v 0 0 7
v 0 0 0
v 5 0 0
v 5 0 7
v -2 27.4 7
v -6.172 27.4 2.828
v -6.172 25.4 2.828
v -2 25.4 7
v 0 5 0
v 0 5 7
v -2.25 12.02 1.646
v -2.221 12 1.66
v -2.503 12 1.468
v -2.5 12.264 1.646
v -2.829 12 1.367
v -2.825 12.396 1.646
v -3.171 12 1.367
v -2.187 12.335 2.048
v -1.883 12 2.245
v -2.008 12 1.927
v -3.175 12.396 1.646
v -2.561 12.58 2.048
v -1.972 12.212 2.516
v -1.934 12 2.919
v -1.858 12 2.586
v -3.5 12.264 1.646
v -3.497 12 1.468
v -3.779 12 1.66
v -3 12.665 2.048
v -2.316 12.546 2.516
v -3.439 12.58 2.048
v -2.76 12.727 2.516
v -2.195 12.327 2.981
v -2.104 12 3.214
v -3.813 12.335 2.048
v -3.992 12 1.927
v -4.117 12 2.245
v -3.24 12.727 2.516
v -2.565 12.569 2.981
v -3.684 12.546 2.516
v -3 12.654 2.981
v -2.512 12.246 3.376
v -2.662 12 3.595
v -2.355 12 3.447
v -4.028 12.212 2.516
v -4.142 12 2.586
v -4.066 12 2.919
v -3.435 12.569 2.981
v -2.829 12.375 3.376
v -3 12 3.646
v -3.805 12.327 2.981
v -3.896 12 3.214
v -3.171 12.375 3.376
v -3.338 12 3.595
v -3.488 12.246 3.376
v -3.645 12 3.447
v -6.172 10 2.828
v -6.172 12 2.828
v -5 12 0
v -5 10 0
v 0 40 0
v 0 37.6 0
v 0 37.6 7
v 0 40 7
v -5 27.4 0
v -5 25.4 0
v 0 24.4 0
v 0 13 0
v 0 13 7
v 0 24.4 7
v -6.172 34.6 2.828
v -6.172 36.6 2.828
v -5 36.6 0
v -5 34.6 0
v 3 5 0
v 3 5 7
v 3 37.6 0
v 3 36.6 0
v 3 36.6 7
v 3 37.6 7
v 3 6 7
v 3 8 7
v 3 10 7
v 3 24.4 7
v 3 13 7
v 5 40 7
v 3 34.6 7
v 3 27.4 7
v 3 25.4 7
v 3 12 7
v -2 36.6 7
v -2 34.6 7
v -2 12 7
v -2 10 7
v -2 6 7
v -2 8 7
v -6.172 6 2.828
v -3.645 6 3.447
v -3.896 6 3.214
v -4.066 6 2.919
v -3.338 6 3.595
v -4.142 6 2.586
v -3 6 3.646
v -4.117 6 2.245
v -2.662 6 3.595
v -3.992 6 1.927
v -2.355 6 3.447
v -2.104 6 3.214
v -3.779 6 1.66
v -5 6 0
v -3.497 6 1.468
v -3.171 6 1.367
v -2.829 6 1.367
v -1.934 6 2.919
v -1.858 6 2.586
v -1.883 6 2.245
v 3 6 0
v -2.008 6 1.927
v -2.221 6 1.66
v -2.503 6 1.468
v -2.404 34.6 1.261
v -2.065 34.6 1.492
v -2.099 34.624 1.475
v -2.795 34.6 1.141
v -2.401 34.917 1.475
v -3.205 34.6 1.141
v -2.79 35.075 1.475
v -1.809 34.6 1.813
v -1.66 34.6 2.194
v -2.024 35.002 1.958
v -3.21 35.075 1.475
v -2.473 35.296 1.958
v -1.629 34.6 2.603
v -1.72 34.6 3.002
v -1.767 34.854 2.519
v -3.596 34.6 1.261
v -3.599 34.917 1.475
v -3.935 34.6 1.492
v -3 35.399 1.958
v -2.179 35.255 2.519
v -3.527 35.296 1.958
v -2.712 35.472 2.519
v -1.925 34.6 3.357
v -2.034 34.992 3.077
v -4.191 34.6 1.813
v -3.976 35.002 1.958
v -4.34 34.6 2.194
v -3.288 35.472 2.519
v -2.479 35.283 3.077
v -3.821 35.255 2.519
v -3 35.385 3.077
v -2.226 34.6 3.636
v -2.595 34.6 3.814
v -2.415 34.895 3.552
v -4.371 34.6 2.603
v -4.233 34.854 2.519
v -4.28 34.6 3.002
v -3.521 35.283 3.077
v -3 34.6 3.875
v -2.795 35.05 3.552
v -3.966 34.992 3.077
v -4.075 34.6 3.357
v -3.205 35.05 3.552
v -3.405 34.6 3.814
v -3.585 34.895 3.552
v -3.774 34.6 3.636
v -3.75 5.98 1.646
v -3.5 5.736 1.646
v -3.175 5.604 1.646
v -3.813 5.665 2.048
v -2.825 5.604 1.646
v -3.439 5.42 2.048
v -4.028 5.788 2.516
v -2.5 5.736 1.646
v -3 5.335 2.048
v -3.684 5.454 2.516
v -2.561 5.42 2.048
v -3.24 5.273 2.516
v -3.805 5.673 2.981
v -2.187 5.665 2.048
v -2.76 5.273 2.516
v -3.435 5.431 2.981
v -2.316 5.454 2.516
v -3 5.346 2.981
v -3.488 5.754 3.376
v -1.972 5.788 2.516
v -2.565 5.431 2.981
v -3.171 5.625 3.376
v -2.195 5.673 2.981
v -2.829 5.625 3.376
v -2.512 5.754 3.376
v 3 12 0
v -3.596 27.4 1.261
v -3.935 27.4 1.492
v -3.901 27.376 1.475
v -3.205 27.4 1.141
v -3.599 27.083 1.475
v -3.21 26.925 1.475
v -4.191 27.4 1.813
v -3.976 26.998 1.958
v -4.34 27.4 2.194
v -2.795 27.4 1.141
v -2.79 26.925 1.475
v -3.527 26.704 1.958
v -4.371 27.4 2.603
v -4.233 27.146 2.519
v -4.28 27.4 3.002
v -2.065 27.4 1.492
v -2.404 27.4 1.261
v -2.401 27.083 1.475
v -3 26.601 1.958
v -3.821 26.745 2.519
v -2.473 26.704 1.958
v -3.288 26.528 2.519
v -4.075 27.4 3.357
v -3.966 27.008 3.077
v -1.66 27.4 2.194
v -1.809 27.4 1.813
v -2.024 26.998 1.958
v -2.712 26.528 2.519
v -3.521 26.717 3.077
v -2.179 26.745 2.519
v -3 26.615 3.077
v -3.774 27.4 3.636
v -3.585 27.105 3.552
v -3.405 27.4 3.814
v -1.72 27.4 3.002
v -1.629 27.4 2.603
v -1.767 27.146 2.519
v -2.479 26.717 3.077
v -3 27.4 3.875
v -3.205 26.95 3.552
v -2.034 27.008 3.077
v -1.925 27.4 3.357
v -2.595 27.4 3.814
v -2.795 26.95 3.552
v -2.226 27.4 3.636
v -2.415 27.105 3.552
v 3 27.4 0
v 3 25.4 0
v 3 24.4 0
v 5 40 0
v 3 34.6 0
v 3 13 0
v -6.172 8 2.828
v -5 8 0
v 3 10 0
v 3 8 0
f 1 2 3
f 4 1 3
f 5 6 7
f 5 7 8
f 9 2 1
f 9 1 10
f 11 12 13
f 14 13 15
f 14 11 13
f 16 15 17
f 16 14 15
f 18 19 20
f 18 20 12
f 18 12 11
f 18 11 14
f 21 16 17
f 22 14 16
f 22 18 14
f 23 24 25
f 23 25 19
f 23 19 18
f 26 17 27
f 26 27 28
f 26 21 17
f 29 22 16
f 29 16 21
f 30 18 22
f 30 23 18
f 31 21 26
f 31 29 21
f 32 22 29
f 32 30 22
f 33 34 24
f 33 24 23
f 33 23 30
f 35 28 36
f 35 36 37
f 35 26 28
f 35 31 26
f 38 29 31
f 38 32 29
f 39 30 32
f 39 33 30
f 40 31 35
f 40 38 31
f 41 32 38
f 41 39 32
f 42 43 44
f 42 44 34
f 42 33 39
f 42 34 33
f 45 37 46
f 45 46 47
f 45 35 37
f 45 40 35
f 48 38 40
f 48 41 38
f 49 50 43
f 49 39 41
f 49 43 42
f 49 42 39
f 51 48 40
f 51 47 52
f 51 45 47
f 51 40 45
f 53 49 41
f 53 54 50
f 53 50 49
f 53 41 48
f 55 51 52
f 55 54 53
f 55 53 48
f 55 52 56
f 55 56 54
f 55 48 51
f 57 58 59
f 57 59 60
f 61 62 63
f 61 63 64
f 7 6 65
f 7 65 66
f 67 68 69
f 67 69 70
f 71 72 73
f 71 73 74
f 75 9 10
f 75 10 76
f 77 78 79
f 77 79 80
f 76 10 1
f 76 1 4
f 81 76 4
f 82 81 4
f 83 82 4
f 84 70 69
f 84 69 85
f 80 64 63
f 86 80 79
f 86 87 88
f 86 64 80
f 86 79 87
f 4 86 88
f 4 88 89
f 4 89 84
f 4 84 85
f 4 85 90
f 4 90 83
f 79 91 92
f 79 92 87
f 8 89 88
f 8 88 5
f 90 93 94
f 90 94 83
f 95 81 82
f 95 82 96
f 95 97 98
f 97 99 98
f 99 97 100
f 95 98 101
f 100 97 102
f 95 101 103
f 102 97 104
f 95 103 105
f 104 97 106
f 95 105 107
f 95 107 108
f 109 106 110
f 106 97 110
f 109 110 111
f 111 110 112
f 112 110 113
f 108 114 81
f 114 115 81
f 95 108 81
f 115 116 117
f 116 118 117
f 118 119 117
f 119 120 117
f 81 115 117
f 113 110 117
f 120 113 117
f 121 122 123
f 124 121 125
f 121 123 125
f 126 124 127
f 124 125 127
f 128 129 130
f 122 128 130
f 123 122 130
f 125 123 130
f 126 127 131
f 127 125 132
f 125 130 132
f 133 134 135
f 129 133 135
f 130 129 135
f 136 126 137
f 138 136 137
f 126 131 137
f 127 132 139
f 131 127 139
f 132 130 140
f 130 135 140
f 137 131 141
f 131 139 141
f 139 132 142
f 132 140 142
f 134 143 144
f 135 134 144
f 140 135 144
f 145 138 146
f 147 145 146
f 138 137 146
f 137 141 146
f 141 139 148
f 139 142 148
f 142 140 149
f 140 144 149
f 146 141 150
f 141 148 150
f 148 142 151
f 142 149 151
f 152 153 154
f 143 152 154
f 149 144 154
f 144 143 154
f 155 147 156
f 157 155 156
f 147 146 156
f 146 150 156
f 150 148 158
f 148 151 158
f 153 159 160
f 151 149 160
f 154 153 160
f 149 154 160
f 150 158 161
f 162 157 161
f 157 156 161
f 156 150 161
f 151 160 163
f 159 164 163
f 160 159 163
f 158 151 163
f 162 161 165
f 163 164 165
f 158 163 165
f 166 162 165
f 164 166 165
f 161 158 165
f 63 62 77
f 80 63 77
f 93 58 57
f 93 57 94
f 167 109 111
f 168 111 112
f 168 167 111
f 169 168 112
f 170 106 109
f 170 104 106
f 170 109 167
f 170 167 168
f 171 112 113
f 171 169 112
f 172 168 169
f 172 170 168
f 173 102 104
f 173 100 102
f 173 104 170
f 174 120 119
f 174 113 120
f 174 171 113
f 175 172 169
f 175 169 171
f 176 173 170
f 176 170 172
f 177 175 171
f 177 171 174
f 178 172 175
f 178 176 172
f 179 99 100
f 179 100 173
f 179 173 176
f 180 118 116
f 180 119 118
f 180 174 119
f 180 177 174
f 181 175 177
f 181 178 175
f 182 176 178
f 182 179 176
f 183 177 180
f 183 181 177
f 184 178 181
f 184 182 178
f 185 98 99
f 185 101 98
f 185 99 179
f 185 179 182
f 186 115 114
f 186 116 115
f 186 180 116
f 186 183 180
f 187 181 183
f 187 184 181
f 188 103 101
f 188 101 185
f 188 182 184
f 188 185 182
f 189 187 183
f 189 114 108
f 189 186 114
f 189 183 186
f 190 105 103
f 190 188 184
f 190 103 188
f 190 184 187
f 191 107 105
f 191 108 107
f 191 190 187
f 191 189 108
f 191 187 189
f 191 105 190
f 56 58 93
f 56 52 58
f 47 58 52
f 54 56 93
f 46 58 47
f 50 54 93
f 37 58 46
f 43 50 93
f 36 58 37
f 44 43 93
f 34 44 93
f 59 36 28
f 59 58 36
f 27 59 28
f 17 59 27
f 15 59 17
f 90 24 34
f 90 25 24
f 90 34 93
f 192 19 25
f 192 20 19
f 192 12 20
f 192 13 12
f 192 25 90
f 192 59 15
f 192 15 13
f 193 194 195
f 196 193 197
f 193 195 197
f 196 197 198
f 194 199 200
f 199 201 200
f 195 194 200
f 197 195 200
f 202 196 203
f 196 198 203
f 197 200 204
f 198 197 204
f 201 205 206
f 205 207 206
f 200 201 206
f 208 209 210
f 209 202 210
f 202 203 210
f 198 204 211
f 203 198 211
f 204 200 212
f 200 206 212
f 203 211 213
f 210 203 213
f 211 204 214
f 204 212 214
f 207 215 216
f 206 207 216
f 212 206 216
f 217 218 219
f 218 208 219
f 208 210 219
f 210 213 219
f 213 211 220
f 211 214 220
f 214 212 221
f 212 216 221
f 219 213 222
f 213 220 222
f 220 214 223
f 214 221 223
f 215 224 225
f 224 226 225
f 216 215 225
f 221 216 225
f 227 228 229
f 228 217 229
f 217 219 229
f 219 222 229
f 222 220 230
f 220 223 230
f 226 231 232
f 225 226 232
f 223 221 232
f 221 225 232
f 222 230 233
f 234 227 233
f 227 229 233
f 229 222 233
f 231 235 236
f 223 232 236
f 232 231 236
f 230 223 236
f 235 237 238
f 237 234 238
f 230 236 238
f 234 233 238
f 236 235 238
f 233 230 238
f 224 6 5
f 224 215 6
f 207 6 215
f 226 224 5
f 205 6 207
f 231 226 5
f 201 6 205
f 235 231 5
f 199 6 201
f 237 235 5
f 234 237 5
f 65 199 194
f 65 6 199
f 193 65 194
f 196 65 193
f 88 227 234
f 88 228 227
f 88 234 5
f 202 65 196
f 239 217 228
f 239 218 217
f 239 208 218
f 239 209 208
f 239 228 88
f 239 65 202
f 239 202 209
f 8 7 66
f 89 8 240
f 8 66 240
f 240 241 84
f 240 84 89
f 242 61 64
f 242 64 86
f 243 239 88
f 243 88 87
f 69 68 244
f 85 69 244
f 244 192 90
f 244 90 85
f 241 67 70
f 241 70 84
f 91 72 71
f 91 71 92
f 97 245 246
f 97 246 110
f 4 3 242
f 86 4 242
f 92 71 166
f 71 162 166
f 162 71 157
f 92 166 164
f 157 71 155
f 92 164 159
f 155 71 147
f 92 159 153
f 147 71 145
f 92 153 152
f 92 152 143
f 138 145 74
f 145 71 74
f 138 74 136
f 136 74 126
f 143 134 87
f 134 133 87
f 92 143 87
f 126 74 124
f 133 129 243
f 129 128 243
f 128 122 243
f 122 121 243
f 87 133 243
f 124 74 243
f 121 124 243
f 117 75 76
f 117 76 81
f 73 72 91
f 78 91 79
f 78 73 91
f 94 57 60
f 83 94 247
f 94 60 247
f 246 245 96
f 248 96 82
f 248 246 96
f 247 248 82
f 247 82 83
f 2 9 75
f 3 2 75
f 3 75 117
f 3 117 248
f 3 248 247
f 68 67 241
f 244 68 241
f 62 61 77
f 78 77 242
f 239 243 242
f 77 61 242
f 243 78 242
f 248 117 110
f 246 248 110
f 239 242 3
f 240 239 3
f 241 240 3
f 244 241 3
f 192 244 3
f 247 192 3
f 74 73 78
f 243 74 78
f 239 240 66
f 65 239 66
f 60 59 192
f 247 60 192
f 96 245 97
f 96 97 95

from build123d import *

# Parameters (mm, degrees)
BOX008_W           = 4
BOX008_H           = 1
BOX008_DEPTH       = 7
BOX010_W           = 4
BOX010_H           = 1
BOX010_DEPTH       = 7
BOX007_W           = 4
BOX007_H           = 2
BOX007_DEPTH       = 7
BOX009_W           = 4
BOX009_H           = 1
BOX009_DEPTH       = 7
BOX006_W           = 4
BOX006_H           = 1
BOX006_DEPTH       = 7
BOX011_W           = 4
BOX011_H           = 7.2
BOX011_DEPTH       = 7
BOX005_W           = 13
BOX005_H           = 40
BOX005_DEPTH       = 10
BOX005_PITCH_ANGLE = -45
BOX_W              = 10
BOX_H              = 2
BOX_DEPTH          = 7
BOX002_W           = 10
BOX002_H           = 2
BOX002_DEPTH       = 7
BOX003_W           = 10
BOX003_H           = 2
BOX003_DEPTH       = 7
BOX004_W           = 10
BOX004_H           = 2
BOX004_DEPTH       = 7
BOX001_W           = 5
BOX001_H           = 40
BOX001_DEPTH       = 7
CHAMFER_SIZE       = 4


with BuildPart() as cube008:
    # Box008 → Box008 (new body)
    with BuildSketch(Plane(origin=(-1, 12, 0), x_dir=(1, 0, 0), z_dir=(0, 0, 1))):
        with Locations((2, 0.5)):
            Rectangle(BOX008_W, BOX008_H)
    extrude(amount=BOX008_DEPTH)


with BuildPart() as cube010:
    # Box010 → Box010 (new body)
    with BuildSketch(Plane(origin=(-1, 36.6, 0), x_dir=(1, 0, 0), z_dir=(0, 0, 1))):
        with Locations((2, 0.5)):
            Rectangle(BOX010_W, BOX010_H)
    extrude(amount=BOX010_DEPTH)


with BuildPart() as cube007:
    # Box007 → Box007 (new body)
    with BuildSketch(Plane(origin=(-1, 8, 0), x_dir=(1, 0, 0), z_dir=(0, 0, 1))):
        with Locations((2, 1)):
            Rectangle(BOX007_W, BOX007_H)
    extrude(amount=BOX007_DEPTH)


with BuildPart() as cube009:
    # Box009 → Box009 (new body)
    with BuildSketch(Plane(origin=(-1, 24.4, 0), x_dir=(1, 0, 0), z_dir=(0, 0, 1))):
        with Locations((2, 0.5)):
            Rectangle(BOX009_W, BOX009_H)
    extrude(amount=BOX009_DEPTH)


with BuildPart() as cube006:
    # Box006 → Box006 (new body)
    with BuildSketch(Plane(origin=(-1, 5, 0), x_dir=(1, 0, 0), z_dir=(0, 0, 1))):
        with Locations((2, 0.5)):
            Rectangle(BOX006_W, BOX006_H)
    extrude(amount=BOX006_DEPTH)


with BuildPart() as fusion003:
    # Box011 → Box011 (new body)
    with BuildSketch(Plane(origin=(-1, 27.4, 0), x_dir=(1, 0, 0), z_dir=(0, 0, 1))):
        with Locations((2, 3.6)):
            Rectangle(BOX011_W, BOX011_H)
    extrude(amount=BOX011_DEPTH)

    # Fusion003: union Cube008, Cube010, Cube007, Cube009, Cube006
    add(cube008.part)
    add(cube010.part)
    add(cube007.part)
    add(cube009.part)
    add(cube006.part)


with BuildPart() as sphere010:
    # Sphere010 → Sphere010 (revolve)
    with BuildSketch(Plane(origin=(-3, 28, 2.5), x_dir=(1, 0, 0), z_dir=(0, -1, 0))):
        with BuildLine():
            ThreePointArc((0, -1.5), (1.5, 0), (0, 1.5))
            Line((0, 1.5), (0, -1.5))
        make_face()
    revolve(axis=Axis((-3, 28, 2.5), (0, 0, 1)))


with BuildPart() as fusion002:
    # Sphere011 → Sphere011 (revolve)
    with BuildSketch(Plane(origin=(-3, 34, 2.5), x_dir=(1, 0, 0), z_dir=(0, -1, 0))):
        with BuildLine():
            ThreePointArc((0, -1.5), (1.5, 0), (0, 1.5))
            Line((0, 1.5), (0, -1.5))
        make_face()
    revolve(axis=Axis((-3, 34, 2.5), (0, 0, 1)))

    # Fusion002: union Sphere010
    add(sphere010.part)


with BuildPart() as sphere009:
    # Sphere009 → Sphere009 (revolve)
    with BuildSketch(Plane(origin=(-3, 11.5, 2.5), x_dir=(1, 0, 0), z_dir=(0, -1, 0))):
        with BuildLine():
            ThreePointArc((0, -1.25), (1.25, 0), (0, 1.25))
            Line((0, 1.25), (0, -1.25))
        make_face()
    revolve(axis=Axis((-3, 11.5, 2.5), (0, 0, 1)))


with BuildPart() as cube005:
    # Box005 → Box005 (new body)
    with BuildSketch(Plane.XY):
        with Locations((6.5, 20)):
            Rectangle(BOX005_W, BOX005_H)
    extrude(amount=BOX005_DEPTH)


with BuildPart() as cube005_1:
    # Box005 pitch: moved
    add(cube005.part.rotate(Axis((0, 0, 0), (0, 1, 0)), BOX005_PITCH_ANGLE))


with BuildPart() as cube005_2:
    # Box005 placement: moved
    add(cube005_1.part.moved(Location((-10.19, 0, -1.19))))


with BuildPart() as cube:
    # Box → Box (new body)
    with BuildSketch(Plane(origin=(-10, 6, 0), x_dir=(1, 0, 0), z_dir=(0, 0, 1))):
        with Locations((5, 1)):
            Rectangle(BOX_W, BOX_H)
    extrude(amount=BOX_DEPTH)


with BuildPart() as cube002:
    # Box002 → Box002 (new body)
    with BuildSketch(Plane(origin=(-10, 10, 0), x_dir=(1, 0, 0), z_dir=(0, 0, 1))):
        with Locations((5, 1)):
            Rectangle(BOX002_W, BOX002_H)
    extrude(amount=BOX002_DEPTH)


with BuildPart() as cube003:
    # Box003 → Box003 (new body)
    with BuildSketch(Plane(origin=(-10, 25.4, 0), x_dir=(1, 0, 0), z_dir=(0, 0, 1))):
        with Locations((5, 1)):
            Rectangle(BOX003_W, BOX003_H)
    extrude(amount=BOX003_DEPTH)


with BuildPart() as cube004:
    # Box004 → Box004 (new body)
    with BuildSketch(Plane(origin=(-10, 34.6, 0), x_dir=(1, 0, 0), z_dir=(0, 0, 1))):
        with Locations((5, 1)):
            Rectangle(BOX004_W, BOX004_H)
    extrude(amount=BOX004_DEPTH)


with BuildPart() as cut:
    # Box001 → Box001 (new body)
    with BuildSketch(Plane.XY):
        with Locations((2.5, 20)):
            Rectangle(BOX001_W, BOX001_H)
    extrude(amount=BOX001_DEPTH)

    # Fusion: union Cube, Cube002, Cube003, Cube004
    add(cube.part)
    add(cube002.part)
    add(cube003.part)
    add(cube004.part)

    # Cut: cut Cube005
    add(cube005_2.part, mode=Mode.SUBTRACT)


with BuildPart() as cut002:
    # Sphere008 → Sphere008 (revolve)
    with BuildSketch(Plane(origin=(-3, 6.5, 2.5), x_dir=(1, 0, 0), z_dir=(0, -1, 0))):
        with BuildLine():
            ThreePointArc((0, -1.25), (1.25, 0), (0, 1.25))
            Line((0, 1.25), (0, -1.25))
        make_face()
    revolve(axis=Axis((-3, 6.5, 2.5), (0, 0, 1)))

    # Fusion001: union Sphere009, Cut
    add(sphere009.part)
    add(cut.part)

    # Cut001: cut Fusion002
    add(fusion002.part, mode=Mode.SUBTRACT)

    # Chamfer
    chamfer_edges = [cut002.edges().sort_by_distance(p)[0] for p in [
        (-9, 7, 0),
        (-9, 11, 0),
        (-9, 35.6, 0),
        (-9, 26.4, 0),
    ]]
    chamfer(chamfer_edges, length=CHAMFER_SIZE)

    # Cut002: cut Fusion003
    add(fusion003.part, mode=Mode.SUBTRACT)


solid = cut002.part
